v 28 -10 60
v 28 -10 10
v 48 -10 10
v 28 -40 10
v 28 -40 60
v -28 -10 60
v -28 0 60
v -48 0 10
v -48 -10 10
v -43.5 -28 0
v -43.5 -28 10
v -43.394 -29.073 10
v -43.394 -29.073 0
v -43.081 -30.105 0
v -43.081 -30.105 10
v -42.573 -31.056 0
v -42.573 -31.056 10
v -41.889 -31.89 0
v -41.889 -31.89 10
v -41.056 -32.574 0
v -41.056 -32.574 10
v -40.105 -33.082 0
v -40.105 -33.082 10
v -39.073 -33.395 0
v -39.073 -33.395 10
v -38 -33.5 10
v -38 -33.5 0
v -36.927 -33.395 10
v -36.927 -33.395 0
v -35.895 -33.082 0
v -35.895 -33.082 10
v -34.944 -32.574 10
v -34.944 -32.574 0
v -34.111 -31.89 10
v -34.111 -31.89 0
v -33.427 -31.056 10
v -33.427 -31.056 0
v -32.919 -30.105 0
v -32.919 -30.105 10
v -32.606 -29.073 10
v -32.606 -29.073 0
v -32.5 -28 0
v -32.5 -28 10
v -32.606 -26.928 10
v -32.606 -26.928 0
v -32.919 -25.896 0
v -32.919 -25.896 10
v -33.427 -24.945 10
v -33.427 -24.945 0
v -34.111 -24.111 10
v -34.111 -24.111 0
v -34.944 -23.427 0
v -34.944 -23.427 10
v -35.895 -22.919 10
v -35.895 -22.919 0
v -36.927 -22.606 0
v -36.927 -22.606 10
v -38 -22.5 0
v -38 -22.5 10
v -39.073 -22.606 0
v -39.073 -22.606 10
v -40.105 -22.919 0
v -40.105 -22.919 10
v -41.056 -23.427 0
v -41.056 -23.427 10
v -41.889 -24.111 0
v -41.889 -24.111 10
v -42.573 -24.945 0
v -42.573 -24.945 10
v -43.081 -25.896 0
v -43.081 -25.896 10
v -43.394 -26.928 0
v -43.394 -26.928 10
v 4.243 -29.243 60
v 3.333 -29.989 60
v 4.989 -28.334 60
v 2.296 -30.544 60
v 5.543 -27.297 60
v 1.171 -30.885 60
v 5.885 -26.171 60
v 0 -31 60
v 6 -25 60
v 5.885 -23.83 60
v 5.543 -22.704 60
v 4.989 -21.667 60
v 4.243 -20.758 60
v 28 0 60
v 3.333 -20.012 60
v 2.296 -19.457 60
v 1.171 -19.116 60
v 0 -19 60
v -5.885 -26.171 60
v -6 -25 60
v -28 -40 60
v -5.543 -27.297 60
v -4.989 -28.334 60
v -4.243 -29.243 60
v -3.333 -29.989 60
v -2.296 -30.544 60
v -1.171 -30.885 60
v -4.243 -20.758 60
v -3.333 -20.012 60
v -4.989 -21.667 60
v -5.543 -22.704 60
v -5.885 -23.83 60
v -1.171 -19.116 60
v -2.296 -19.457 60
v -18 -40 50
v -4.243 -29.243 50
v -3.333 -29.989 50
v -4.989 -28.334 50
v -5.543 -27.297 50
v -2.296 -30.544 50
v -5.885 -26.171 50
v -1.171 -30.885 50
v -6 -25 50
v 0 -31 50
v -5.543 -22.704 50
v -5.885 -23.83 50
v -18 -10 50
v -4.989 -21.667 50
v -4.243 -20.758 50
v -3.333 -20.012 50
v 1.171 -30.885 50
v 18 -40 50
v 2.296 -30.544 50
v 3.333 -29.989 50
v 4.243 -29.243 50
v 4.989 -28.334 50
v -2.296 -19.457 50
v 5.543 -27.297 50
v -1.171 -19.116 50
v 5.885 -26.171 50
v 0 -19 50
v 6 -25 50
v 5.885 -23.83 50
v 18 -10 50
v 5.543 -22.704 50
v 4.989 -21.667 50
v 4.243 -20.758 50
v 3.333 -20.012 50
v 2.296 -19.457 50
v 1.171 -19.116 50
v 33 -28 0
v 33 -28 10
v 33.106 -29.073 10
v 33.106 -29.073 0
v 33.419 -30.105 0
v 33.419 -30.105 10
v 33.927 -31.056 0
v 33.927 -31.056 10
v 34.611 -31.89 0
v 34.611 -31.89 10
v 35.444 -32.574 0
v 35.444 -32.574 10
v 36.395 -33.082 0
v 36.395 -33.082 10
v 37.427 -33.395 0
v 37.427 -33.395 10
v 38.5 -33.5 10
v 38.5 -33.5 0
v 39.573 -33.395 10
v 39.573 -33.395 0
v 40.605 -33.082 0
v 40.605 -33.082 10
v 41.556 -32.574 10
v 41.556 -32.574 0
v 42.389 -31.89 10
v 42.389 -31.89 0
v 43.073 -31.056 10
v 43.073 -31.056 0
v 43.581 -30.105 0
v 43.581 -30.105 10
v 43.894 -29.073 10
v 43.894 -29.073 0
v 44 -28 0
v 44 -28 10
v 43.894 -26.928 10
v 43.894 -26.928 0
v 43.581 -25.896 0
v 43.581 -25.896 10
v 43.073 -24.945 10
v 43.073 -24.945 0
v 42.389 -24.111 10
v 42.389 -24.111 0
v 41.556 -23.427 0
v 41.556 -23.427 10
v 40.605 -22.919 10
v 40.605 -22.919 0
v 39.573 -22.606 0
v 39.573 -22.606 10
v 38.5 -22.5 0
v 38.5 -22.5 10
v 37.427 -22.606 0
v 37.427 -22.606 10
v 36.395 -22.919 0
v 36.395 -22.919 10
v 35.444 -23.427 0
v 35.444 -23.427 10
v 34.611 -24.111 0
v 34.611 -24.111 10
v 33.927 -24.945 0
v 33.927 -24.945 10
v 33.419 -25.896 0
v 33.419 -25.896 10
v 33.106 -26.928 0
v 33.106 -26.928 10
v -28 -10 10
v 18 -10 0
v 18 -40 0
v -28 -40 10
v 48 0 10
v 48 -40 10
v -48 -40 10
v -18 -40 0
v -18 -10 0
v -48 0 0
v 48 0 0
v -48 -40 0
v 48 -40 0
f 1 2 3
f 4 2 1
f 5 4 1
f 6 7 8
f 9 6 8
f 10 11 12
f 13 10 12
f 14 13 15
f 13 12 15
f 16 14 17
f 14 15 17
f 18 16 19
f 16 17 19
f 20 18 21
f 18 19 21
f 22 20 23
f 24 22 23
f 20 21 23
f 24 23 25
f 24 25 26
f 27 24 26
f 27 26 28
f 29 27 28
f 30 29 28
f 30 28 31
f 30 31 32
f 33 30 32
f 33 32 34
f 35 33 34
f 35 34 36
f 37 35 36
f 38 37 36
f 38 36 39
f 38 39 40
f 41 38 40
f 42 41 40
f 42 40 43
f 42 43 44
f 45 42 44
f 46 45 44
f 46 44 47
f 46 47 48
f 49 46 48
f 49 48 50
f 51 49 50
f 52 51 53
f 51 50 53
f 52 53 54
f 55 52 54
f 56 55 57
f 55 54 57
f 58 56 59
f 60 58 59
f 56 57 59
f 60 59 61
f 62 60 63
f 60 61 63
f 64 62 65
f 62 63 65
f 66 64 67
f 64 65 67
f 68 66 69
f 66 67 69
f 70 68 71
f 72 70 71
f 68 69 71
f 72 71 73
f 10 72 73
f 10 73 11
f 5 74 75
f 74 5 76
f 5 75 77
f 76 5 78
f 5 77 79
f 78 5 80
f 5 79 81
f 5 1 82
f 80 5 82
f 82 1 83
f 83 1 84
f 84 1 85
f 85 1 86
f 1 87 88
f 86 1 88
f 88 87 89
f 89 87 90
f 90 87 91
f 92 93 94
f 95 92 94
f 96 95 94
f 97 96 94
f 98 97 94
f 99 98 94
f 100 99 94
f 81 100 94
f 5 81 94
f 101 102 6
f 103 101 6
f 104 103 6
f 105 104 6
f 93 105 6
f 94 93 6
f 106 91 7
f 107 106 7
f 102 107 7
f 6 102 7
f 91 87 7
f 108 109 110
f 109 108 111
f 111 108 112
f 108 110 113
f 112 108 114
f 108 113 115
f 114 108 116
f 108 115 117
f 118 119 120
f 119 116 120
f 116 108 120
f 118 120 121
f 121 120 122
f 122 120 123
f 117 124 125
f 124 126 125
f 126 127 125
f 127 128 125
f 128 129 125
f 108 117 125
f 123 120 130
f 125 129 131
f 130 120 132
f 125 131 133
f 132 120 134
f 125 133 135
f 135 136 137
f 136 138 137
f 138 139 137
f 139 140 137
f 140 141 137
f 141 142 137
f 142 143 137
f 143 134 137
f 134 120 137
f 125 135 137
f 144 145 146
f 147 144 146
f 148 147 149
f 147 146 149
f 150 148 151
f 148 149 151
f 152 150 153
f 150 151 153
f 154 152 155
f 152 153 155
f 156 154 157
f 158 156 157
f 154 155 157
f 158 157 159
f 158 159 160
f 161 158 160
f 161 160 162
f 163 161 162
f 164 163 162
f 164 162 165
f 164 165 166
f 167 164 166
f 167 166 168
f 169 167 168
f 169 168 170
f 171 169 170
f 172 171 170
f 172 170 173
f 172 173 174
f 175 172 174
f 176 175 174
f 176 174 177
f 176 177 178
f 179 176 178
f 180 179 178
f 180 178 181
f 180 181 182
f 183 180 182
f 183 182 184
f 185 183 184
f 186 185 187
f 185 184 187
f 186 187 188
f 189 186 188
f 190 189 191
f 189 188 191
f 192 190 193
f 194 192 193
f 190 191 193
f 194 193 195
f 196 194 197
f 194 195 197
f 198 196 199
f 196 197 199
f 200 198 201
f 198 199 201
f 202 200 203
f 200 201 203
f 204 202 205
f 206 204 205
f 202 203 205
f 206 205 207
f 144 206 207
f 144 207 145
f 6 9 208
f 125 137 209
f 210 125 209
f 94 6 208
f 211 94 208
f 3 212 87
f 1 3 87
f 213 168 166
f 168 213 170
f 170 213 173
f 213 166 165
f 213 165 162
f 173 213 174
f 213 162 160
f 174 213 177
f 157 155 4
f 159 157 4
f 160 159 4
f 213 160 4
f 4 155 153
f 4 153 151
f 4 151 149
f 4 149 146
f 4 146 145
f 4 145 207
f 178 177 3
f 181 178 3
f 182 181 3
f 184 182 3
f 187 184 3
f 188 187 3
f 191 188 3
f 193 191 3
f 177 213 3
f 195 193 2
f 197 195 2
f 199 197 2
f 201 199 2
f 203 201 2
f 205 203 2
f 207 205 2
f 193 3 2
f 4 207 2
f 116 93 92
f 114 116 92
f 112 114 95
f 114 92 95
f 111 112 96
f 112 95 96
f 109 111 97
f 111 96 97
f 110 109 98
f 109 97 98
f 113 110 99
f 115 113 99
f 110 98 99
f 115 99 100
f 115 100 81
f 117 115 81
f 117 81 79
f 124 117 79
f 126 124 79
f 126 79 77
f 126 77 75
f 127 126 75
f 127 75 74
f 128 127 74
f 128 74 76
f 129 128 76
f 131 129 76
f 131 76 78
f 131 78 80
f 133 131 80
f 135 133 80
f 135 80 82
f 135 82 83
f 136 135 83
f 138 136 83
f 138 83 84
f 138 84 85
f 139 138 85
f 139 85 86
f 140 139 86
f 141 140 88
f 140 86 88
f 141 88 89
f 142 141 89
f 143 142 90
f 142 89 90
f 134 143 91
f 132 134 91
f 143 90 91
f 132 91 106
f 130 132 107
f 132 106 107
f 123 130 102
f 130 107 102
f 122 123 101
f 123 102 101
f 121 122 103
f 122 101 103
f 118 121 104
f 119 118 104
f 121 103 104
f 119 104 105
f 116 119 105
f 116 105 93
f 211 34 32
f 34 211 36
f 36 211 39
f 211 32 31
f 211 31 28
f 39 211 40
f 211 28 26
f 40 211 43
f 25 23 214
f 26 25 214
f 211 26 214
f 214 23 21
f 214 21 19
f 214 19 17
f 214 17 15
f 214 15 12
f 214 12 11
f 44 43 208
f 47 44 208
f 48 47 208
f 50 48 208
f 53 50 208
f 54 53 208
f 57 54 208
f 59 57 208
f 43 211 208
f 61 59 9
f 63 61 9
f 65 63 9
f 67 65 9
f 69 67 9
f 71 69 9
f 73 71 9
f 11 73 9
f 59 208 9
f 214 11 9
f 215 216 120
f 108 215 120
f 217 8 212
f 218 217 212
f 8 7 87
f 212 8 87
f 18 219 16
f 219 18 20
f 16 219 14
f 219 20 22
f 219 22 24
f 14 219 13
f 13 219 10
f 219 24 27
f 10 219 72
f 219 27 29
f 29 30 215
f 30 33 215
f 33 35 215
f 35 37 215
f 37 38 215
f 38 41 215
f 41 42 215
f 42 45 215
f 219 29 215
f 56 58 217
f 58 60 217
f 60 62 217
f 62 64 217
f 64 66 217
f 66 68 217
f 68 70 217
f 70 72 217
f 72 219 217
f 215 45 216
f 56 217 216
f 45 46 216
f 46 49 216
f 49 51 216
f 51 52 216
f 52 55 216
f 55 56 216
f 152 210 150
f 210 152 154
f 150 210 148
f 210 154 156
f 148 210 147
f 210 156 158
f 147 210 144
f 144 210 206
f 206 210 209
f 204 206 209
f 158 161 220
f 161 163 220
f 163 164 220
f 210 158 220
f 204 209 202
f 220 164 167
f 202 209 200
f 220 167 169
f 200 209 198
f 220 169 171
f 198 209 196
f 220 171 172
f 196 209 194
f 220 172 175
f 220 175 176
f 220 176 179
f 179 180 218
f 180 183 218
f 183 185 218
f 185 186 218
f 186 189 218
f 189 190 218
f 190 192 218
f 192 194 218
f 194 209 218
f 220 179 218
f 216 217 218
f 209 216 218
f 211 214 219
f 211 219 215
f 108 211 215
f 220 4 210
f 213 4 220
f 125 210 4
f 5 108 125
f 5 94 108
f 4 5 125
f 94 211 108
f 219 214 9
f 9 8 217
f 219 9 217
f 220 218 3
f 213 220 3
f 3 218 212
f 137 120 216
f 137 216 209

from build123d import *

# Parameters (mm, degrees)
F2_DEPTH = 40
F3_DEPTH = 10
F4_D     = 12
F5_D     = 11
F6_D     = 11


with BuildPart() as f2:
    # F0 (on Front) → F2 (new body)
    with BuildSketch(Plane.XZ):
        Polygon((-48, 10), (-48, 0), (-18, 0), (-18, 50), (18, 50), (18, 0), (48, 0), (48, 10), (28, 10), (28, 60), (-28, 60), (-28, 10), align=None)
    extrude(amount=F2_DEPTH)

    # F0 (on Front) → F3 (join)
    with BuildSketch(Plane.XZ):
        Polygon((48, 10), (28, 60), (28, 10), align=None)
        Polygon((-28, 60), (-48, 10), (-28, 10), align=None)
        Polygon((-18, 50), (-18, 0), (0, 0), (18, 0), (18, 50), align=None)
    extrude(amount=F3_DEPTH)

    # F4 (through all)
    with Locations(Plane(origin=(0, 0, 0), x_dir=(1, 0, 0), z_dir=(0, 0, -1))):
        with Locations((-4.172e-07, 25.0004983976)):
            Hole(F4_D / 2)

    # F5 (through all)
    with Locations(Plane(origin=(0, 0, 0), x_dir=(1, 0, 0), z_dir=(0, 0, -1))):
        with Locations((38.4999995828, 28.0004983976)):
            Hole(F5_D / 2)

    # F6 (through all)
    with Locations(Plane(origin=(0, 0, 0), x_dir=(1, 0, 0), z_dir=(0, 0, -1))):
        with Locations((-38.0000004172, 28.0004983976)):
            Hole(F6_D / 2)


solid = f2.part
